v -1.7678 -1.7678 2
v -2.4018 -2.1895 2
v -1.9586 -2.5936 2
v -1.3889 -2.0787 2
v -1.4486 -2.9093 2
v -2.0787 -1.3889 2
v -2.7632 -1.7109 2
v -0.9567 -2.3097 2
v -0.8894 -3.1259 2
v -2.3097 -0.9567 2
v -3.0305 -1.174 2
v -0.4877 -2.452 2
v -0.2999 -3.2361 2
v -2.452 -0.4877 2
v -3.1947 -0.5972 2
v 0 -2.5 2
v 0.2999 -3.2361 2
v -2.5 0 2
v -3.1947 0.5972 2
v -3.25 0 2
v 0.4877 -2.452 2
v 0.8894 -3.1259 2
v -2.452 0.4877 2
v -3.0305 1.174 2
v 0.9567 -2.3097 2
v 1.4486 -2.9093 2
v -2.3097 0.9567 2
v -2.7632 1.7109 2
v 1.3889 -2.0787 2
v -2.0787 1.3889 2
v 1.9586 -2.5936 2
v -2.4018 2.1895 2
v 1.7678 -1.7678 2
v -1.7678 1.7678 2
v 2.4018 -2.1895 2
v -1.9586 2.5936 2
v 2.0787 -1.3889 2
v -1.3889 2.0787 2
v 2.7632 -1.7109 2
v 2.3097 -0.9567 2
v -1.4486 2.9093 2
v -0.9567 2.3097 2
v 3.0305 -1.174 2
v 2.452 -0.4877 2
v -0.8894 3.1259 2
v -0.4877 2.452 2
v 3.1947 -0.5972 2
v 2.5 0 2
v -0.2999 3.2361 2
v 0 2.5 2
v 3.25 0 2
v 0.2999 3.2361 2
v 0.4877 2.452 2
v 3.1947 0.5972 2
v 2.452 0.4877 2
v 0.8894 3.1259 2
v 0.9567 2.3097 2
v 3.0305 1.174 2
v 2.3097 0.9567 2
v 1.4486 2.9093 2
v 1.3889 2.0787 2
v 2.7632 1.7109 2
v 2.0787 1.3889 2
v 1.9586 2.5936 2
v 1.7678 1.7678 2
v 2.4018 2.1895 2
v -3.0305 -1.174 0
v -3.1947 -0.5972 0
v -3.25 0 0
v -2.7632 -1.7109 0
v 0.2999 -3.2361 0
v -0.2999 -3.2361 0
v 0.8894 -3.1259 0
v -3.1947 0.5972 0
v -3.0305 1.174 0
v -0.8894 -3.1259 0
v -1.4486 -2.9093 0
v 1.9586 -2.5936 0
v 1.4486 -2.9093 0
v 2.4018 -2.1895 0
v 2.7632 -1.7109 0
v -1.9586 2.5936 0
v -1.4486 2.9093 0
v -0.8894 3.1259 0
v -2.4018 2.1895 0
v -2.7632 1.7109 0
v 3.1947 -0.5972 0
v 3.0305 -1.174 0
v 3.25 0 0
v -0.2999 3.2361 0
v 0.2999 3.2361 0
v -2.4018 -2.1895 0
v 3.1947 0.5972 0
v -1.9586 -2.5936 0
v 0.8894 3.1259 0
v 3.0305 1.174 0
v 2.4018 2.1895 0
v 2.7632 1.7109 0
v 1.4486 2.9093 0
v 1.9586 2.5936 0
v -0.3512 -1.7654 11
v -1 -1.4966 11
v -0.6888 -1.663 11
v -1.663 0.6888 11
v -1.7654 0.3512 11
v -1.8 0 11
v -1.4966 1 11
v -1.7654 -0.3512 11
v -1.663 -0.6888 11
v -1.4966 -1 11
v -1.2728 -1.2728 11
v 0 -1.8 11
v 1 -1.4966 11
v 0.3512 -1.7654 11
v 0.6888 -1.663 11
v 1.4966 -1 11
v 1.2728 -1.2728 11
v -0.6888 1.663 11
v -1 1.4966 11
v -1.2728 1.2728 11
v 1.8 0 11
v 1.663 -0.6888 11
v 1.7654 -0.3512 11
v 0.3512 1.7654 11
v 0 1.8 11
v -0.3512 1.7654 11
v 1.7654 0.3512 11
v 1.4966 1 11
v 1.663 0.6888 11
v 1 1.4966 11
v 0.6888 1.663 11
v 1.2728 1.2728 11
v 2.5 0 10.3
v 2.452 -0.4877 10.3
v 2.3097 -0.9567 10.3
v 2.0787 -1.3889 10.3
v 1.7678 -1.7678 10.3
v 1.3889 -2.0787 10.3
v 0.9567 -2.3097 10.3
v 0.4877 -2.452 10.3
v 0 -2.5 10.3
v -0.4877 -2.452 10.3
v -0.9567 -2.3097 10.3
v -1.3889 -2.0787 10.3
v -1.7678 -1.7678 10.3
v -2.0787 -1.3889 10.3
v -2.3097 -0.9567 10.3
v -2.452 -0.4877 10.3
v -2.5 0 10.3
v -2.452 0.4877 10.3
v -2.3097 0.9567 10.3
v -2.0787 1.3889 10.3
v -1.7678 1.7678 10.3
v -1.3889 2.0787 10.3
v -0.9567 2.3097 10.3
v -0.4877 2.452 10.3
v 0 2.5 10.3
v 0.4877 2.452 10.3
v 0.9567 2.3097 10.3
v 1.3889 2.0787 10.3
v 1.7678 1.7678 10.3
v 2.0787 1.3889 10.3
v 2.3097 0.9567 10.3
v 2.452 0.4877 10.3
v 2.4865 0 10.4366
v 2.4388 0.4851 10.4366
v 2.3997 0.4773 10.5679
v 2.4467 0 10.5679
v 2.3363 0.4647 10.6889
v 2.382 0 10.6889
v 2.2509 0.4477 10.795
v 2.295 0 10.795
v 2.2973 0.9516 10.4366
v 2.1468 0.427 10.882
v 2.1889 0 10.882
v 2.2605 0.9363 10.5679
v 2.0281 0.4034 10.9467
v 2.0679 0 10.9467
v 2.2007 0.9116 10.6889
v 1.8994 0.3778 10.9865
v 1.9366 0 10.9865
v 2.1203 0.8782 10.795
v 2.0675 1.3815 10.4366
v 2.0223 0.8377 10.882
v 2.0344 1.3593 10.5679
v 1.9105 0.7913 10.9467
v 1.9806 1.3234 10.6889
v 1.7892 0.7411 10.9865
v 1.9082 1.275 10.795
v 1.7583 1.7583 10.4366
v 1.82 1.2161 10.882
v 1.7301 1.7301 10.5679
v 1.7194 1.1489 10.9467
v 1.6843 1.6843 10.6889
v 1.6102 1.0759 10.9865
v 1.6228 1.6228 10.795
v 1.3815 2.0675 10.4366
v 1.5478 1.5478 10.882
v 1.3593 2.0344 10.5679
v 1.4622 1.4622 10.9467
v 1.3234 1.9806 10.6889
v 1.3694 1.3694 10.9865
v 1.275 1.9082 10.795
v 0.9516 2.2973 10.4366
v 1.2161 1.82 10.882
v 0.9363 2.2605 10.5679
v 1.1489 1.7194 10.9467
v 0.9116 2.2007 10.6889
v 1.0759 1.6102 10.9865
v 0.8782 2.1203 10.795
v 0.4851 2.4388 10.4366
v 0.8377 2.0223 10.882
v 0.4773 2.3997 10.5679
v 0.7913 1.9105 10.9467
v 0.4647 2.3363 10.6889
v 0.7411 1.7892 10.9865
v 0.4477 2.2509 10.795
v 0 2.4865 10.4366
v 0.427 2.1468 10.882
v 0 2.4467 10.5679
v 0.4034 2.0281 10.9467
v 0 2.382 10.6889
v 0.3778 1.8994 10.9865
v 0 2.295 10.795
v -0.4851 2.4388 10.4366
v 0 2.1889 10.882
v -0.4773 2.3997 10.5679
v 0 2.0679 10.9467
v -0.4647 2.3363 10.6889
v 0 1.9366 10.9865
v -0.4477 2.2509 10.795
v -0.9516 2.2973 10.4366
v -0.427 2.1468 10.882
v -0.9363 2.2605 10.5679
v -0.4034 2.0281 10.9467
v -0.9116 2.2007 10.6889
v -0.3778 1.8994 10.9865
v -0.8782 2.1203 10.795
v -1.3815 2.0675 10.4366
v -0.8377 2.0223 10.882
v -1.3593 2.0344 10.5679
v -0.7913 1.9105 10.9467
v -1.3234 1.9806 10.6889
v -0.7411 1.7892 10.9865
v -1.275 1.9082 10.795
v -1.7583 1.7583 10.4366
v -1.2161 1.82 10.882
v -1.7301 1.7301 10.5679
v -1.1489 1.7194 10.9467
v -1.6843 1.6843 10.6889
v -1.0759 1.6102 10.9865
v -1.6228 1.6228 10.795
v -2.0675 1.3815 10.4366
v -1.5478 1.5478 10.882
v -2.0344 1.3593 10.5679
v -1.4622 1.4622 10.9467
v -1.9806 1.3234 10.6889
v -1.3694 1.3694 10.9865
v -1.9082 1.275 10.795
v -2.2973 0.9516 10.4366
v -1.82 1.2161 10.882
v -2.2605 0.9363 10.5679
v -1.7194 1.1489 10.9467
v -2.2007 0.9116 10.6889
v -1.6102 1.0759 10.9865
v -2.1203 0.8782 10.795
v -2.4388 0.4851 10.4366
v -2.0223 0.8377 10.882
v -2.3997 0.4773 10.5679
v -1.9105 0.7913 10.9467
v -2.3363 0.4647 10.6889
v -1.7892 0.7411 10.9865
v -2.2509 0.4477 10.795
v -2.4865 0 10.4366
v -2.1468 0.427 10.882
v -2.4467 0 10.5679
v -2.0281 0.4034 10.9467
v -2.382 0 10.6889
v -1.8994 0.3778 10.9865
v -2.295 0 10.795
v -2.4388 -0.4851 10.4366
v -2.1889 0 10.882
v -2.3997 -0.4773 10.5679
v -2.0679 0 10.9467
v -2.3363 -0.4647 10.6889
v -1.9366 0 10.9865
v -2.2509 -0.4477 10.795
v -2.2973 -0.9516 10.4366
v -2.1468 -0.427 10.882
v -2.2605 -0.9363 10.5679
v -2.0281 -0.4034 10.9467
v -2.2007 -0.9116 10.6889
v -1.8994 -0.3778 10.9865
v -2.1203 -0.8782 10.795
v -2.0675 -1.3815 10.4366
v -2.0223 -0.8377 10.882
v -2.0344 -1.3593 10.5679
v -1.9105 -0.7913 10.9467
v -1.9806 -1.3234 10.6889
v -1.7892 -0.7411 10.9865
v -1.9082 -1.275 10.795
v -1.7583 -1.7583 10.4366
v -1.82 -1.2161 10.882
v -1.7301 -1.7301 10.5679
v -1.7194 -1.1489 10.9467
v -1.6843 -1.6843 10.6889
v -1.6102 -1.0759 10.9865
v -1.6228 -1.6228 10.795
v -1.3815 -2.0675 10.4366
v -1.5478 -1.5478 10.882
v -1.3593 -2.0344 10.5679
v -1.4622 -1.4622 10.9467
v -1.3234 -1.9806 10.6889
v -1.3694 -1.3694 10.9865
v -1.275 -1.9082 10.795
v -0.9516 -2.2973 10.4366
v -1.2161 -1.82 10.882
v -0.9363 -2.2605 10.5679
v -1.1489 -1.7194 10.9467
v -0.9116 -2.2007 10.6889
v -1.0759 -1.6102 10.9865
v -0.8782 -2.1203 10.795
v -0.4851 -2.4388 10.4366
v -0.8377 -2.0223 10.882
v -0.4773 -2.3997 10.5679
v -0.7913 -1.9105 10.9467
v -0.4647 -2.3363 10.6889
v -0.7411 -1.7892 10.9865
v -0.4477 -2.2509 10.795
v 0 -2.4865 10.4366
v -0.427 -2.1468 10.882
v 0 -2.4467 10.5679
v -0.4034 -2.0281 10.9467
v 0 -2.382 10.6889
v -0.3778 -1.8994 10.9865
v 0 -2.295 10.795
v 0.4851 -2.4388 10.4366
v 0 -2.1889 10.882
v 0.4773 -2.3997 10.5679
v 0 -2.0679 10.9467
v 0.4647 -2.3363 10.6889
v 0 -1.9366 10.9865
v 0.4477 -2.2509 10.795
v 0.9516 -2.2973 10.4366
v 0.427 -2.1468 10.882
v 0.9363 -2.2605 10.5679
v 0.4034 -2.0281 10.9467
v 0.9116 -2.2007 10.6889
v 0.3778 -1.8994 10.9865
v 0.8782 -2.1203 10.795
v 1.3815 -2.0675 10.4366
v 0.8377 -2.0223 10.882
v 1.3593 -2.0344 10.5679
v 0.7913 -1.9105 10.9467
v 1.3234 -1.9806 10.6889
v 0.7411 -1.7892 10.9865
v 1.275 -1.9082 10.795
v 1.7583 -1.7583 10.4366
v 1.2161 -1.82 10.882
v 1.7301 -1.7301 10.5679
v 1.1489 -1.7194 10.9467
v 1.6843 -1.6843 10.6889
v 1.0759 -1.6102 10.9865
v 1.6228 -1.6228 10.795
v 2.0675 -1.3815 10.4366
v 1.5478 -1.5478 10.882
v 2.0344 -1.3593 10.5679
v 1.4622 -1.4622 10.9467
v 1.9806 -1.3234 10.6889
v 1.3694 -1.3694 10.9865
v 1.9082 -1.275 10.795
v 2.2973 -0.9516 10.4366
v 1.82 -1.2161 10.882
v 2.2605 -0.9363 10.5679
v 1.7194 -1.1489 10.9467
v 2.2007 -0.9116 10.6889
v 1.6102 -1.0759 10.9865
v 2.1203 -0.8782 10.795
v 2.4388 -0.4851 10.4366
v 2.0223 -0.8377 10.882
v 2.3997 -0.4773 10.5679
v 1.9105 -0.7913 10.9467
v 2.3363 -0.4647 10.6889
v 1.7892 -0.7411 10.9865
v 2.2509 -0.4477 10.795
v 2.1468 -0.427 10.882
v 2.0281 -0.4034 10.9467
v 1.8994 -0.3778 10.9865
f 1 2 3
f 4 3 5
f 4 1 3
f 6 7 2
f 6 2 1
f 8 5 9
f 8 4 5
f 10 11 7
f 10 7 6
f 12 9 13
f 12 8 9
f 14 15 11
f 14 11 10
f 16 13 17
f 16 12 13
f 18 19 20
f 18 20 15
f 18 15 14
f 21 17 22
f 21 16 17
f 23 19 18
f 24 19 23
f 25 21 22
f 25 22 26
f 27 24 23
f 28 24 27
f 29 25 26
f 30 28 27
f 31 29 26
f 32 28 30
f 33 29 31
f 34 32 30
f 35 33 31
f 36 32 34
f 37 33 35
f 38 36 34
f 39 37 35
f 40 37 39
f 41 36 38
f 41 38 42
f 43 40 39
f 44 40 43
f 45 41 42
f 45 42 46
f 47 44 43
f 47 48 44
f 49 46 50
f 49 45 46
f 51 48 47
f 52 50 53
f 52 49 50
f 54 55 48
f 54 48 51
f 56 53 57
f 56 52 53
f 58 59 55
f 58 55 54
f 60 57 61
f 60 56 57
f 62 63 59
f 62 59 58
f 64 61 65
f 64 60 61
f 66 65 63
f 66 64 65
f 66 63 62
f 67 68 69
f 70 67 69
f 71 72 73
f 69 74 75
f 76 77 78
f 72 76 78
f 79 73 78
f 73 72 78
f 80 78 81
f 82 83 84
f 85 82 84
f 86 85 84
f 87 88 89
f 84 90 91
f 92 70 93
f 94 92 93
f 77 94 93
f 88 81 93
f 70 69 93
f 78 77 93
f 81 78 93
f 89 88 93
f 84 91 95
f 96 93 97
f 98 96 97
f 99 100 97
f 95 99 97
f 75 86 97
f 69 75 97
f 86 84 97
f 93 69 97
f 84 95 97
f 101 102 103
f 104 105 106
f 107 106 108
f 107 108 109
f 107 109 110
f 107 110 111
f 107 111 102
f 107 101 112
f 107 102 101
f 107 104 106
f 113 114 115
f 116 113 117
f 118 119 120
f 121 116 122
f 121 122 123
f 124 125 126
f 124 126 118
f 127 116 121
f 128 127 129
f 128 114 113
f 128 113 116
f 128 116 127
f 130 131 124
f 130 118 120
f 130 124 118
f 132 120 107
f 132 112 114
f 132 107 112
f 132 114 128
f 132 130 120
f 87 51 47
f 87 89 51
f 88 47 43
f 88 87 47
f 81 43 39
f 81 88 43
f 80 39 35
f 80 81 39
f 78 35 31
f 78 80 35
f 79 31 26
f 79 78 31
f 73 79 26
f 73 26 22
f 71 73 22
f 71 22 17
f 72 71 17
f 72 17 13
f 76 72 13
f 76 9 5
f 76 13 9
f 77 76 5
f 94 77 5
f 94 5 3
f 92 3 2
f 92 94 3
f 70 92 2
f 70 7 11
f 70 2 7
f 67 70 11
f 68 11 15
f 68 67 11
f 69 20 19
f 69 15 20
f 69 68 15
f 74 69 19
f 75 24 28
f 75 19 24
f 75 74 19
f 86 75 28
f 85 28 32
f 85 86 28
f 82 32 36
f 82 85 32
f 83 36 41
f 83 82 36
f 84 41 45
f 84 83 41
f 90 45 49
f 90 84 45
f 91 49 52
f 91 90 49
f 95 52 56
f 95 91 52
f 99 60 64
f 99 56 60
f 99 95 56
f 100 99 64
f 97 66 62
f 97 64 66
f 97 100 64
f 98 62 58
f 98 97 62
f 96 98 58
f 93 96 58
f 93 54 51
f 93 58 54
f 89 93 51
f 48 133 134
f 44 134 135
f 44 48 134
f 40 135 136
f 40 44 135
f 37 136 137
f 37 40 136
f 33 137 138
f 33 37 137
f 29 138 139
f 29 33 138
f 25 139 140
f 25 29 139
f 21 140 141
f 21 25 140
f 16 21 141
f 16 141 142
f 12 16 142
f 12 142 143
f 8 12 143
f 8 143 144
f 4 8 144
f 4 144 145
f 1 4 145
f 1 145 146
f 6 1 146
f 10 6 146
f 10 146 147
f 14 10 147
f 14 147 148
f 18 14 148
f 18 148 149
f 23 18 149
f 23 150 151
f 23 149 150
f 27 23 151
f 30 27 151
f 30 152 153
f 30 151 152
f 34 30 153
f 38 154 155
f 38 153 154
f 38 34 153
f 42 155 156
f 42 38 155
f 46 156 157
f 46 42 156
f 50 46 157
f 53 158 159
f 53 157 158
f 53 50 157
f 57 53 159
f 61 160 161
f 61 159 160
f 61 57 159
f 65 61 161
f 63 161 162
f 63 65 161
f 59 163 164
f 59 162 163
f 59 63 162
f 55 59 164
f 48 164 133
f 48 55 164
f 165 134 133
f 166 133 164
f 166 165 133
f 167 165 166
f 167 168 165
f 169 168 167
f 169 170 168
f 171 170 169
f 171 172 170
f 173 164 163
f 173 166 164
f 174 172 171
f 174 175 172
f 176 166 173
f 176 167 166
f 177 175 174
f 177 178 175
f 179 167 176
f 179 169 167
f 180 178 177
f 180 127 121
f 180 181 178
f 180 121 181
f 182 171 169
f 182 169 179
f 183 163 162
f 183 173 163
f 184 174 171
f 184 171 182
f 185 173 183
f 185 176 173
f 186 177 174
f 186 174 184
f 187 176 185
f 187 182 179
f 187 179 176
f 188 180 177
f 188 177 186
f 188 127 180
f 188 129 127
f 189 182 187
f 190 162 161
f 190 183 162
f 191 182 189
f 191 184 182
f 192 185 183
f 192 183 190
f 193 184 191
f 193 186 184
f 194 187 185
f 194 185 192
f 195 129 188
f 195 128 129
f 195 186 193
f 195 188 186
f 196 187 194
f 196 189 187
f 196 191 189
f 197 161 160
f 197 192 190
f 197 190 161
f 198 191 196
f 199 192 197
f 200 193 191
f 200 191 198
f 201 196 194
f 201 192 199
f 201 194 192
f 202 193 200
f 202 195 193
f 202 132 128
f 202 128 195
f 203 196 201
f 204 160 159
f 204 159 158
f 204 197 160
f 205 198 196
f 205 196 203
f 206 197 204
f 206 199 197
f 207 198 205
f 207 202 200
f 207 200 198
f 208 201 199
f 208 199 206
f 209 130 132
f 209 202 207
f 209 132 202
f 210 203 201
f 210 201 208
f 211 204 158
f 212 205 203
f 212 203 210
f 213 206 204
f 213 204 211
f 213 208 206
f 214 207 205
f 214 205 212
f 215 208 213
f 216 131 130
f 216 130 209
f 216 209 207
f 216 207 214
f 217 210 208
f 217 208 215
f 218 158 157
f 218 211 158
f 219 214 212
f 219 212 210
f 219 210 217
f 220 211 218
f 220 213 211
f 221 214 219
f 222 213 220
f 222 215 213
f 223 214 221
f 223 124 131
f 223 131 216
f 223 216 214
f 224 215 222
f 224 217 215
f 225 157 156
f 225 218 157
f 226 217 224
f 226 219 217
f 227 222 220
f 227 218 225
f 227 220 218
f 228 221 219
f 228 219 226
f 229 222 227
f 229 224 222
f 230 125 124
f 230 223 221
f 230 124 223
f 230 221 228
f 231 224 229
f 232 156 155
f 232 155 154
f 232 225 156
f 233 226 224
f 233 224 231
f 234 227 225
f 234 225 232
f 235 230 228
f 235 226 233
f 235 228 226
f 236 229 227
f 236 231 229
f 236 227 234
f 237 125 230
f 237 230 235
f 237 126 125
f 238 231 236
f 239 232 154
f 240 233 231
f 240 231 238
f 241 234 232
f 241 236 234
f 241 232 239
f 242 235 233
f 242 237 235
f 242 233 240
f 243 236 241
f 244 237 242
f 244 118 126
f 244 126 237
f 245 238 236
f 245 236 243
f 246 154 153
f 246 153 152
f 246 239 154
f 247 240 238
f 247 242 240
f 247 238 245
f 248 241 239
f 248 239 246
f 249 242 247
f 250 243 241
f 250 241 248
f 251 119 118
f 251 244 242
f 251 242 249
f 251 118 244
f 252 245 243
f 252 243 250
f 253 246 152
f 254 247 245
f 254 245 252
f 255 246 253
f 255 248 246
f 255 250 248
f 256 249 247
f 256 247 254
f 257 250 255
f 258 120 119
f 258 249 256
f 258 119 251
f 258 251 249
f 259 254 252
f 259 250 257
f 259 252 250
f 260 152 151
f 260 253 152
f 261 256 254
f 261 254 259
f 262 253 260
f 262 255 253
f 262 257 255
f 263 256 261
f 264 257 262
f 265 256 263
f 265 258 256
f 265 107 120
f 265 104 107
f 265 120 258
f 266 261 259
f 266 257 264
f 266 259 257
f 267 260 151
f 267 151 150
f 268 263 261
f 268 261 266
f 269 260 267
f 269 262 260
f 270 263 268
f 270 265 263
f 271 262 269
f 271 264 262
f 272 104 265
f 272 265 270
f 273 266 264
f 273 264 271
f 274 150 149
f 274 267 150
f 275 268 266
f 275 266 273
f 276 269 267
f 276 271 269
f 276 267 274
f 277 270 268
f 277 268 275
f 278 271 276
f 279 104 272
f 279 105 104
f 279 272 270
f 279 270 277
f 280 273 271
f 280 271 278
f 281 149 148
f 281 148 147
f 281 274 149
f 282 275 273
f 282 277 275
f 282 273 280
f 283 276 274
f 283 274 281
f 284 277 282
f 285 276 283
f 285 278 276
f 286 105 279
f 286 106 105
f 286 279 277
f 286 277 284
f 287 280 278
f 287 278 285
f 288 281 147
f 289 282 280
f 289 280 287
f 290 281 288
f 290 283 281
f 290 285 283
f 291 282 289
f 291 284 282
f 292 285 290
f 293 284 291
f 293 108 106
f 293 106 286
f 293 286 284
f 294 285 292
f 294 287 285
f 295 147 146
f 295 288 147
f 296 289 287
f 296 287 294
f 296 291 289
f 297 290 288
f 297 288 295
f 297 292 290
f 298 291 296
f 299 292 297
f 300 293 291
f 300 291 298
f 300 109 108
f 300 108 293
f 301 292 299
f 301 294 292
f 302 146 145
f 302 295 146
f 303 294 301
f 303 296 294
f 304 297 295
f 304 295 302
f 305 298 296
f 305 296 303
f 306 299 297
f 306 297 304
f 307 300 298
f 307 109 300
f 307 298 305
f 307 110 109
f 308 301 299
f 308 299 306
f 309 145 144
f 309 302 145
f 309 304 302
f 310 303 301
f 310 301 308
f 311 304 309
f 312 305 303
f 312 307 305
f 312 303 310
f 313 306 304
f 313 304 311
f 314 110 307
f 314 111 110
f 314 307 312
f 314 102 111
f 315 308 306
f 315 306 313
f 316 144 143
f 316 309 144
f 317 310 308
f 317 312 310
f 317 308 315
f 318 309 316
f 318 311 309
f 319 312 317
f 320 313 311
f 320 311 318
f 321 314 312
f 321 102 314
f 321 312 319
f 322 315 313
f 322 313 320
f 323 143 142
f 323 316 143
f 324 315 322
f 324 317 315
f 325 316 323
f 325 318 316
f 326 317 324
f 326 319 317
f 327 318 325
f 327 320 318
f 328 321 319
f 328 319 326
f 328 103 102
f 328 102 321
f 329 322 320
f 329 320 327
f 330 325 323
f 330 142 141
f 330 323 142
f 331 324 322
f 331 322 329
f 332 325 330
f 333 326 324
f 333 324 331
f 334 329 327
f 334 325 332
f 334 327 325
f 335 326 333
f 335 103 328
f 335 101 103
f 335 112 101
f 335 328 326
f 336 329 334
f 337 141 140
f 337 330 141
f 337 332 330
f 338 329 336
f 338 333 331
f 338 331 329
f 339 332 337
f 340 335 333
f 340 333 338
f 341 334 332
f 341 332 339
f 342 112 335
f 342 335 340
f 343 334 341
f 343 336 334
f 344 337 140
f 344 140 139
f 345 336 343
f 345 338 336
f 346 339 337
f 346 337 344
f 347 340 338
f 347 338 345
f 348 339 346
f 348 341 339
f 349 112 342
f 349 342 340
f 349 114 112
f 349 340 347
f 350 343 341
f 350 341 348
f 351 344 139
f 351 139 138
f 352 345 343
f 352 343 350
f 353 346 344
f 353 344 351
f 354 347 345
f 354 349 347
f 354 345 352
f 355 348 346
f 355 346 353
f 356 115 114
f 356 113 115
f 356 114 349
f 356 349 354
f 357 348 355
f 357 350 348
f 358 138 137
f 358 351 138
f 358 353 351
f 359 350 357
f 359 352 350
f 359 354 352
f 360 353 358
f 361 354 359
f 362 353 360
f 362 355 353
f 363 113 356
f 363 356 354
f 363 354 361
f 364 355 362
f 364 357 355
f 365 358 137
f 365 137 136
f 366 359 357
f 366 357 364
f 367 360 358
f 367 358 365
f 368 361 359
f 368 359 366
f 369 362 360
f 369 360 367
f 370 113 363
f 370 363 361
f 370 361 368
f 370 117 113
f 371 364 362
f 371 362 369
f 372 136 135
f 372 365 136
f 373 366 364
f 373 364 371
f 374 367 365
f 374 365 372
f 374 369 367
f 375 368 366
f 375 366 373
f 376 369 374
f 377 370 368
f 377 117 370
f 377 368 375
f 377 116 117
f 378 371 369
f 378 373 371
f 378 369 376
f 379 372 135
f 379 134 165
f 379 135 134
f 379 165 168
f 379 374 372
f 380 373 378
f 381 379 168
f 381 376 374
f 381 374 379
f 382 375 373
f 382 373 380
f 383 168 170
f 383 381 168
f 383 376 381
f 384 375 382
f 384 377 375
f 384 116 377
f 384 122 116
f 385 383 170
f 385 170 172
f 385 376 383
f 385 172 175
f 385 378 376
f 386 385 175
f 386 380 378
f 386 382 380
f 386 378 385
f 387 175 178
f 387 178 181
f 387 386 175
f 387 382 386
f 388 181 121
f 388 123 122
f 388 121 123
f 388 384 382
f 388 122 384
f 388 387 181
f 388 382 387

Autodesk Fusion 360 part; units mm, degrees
sketch "Sketch1" plane through (0, 0, 0) normal (0, 0, 1) x (1, 0, 0)
  circle A0 centre (0, 0) radius 2.5
  circle A1 centre (0, 0) radius 3.25
  dimension "d1" = 5
  dimension "d2" = 6.5
extrude "Extrude1" add sketch "Sketch1" along normal blind 2 contours A0 | A1
extrude "Extrude2" add sketch "Sketch1" along normal blind 11 contours A0
fillet "Fillet1" radius 0.7 1 edges at (-2.3308, -0.904, 11)
